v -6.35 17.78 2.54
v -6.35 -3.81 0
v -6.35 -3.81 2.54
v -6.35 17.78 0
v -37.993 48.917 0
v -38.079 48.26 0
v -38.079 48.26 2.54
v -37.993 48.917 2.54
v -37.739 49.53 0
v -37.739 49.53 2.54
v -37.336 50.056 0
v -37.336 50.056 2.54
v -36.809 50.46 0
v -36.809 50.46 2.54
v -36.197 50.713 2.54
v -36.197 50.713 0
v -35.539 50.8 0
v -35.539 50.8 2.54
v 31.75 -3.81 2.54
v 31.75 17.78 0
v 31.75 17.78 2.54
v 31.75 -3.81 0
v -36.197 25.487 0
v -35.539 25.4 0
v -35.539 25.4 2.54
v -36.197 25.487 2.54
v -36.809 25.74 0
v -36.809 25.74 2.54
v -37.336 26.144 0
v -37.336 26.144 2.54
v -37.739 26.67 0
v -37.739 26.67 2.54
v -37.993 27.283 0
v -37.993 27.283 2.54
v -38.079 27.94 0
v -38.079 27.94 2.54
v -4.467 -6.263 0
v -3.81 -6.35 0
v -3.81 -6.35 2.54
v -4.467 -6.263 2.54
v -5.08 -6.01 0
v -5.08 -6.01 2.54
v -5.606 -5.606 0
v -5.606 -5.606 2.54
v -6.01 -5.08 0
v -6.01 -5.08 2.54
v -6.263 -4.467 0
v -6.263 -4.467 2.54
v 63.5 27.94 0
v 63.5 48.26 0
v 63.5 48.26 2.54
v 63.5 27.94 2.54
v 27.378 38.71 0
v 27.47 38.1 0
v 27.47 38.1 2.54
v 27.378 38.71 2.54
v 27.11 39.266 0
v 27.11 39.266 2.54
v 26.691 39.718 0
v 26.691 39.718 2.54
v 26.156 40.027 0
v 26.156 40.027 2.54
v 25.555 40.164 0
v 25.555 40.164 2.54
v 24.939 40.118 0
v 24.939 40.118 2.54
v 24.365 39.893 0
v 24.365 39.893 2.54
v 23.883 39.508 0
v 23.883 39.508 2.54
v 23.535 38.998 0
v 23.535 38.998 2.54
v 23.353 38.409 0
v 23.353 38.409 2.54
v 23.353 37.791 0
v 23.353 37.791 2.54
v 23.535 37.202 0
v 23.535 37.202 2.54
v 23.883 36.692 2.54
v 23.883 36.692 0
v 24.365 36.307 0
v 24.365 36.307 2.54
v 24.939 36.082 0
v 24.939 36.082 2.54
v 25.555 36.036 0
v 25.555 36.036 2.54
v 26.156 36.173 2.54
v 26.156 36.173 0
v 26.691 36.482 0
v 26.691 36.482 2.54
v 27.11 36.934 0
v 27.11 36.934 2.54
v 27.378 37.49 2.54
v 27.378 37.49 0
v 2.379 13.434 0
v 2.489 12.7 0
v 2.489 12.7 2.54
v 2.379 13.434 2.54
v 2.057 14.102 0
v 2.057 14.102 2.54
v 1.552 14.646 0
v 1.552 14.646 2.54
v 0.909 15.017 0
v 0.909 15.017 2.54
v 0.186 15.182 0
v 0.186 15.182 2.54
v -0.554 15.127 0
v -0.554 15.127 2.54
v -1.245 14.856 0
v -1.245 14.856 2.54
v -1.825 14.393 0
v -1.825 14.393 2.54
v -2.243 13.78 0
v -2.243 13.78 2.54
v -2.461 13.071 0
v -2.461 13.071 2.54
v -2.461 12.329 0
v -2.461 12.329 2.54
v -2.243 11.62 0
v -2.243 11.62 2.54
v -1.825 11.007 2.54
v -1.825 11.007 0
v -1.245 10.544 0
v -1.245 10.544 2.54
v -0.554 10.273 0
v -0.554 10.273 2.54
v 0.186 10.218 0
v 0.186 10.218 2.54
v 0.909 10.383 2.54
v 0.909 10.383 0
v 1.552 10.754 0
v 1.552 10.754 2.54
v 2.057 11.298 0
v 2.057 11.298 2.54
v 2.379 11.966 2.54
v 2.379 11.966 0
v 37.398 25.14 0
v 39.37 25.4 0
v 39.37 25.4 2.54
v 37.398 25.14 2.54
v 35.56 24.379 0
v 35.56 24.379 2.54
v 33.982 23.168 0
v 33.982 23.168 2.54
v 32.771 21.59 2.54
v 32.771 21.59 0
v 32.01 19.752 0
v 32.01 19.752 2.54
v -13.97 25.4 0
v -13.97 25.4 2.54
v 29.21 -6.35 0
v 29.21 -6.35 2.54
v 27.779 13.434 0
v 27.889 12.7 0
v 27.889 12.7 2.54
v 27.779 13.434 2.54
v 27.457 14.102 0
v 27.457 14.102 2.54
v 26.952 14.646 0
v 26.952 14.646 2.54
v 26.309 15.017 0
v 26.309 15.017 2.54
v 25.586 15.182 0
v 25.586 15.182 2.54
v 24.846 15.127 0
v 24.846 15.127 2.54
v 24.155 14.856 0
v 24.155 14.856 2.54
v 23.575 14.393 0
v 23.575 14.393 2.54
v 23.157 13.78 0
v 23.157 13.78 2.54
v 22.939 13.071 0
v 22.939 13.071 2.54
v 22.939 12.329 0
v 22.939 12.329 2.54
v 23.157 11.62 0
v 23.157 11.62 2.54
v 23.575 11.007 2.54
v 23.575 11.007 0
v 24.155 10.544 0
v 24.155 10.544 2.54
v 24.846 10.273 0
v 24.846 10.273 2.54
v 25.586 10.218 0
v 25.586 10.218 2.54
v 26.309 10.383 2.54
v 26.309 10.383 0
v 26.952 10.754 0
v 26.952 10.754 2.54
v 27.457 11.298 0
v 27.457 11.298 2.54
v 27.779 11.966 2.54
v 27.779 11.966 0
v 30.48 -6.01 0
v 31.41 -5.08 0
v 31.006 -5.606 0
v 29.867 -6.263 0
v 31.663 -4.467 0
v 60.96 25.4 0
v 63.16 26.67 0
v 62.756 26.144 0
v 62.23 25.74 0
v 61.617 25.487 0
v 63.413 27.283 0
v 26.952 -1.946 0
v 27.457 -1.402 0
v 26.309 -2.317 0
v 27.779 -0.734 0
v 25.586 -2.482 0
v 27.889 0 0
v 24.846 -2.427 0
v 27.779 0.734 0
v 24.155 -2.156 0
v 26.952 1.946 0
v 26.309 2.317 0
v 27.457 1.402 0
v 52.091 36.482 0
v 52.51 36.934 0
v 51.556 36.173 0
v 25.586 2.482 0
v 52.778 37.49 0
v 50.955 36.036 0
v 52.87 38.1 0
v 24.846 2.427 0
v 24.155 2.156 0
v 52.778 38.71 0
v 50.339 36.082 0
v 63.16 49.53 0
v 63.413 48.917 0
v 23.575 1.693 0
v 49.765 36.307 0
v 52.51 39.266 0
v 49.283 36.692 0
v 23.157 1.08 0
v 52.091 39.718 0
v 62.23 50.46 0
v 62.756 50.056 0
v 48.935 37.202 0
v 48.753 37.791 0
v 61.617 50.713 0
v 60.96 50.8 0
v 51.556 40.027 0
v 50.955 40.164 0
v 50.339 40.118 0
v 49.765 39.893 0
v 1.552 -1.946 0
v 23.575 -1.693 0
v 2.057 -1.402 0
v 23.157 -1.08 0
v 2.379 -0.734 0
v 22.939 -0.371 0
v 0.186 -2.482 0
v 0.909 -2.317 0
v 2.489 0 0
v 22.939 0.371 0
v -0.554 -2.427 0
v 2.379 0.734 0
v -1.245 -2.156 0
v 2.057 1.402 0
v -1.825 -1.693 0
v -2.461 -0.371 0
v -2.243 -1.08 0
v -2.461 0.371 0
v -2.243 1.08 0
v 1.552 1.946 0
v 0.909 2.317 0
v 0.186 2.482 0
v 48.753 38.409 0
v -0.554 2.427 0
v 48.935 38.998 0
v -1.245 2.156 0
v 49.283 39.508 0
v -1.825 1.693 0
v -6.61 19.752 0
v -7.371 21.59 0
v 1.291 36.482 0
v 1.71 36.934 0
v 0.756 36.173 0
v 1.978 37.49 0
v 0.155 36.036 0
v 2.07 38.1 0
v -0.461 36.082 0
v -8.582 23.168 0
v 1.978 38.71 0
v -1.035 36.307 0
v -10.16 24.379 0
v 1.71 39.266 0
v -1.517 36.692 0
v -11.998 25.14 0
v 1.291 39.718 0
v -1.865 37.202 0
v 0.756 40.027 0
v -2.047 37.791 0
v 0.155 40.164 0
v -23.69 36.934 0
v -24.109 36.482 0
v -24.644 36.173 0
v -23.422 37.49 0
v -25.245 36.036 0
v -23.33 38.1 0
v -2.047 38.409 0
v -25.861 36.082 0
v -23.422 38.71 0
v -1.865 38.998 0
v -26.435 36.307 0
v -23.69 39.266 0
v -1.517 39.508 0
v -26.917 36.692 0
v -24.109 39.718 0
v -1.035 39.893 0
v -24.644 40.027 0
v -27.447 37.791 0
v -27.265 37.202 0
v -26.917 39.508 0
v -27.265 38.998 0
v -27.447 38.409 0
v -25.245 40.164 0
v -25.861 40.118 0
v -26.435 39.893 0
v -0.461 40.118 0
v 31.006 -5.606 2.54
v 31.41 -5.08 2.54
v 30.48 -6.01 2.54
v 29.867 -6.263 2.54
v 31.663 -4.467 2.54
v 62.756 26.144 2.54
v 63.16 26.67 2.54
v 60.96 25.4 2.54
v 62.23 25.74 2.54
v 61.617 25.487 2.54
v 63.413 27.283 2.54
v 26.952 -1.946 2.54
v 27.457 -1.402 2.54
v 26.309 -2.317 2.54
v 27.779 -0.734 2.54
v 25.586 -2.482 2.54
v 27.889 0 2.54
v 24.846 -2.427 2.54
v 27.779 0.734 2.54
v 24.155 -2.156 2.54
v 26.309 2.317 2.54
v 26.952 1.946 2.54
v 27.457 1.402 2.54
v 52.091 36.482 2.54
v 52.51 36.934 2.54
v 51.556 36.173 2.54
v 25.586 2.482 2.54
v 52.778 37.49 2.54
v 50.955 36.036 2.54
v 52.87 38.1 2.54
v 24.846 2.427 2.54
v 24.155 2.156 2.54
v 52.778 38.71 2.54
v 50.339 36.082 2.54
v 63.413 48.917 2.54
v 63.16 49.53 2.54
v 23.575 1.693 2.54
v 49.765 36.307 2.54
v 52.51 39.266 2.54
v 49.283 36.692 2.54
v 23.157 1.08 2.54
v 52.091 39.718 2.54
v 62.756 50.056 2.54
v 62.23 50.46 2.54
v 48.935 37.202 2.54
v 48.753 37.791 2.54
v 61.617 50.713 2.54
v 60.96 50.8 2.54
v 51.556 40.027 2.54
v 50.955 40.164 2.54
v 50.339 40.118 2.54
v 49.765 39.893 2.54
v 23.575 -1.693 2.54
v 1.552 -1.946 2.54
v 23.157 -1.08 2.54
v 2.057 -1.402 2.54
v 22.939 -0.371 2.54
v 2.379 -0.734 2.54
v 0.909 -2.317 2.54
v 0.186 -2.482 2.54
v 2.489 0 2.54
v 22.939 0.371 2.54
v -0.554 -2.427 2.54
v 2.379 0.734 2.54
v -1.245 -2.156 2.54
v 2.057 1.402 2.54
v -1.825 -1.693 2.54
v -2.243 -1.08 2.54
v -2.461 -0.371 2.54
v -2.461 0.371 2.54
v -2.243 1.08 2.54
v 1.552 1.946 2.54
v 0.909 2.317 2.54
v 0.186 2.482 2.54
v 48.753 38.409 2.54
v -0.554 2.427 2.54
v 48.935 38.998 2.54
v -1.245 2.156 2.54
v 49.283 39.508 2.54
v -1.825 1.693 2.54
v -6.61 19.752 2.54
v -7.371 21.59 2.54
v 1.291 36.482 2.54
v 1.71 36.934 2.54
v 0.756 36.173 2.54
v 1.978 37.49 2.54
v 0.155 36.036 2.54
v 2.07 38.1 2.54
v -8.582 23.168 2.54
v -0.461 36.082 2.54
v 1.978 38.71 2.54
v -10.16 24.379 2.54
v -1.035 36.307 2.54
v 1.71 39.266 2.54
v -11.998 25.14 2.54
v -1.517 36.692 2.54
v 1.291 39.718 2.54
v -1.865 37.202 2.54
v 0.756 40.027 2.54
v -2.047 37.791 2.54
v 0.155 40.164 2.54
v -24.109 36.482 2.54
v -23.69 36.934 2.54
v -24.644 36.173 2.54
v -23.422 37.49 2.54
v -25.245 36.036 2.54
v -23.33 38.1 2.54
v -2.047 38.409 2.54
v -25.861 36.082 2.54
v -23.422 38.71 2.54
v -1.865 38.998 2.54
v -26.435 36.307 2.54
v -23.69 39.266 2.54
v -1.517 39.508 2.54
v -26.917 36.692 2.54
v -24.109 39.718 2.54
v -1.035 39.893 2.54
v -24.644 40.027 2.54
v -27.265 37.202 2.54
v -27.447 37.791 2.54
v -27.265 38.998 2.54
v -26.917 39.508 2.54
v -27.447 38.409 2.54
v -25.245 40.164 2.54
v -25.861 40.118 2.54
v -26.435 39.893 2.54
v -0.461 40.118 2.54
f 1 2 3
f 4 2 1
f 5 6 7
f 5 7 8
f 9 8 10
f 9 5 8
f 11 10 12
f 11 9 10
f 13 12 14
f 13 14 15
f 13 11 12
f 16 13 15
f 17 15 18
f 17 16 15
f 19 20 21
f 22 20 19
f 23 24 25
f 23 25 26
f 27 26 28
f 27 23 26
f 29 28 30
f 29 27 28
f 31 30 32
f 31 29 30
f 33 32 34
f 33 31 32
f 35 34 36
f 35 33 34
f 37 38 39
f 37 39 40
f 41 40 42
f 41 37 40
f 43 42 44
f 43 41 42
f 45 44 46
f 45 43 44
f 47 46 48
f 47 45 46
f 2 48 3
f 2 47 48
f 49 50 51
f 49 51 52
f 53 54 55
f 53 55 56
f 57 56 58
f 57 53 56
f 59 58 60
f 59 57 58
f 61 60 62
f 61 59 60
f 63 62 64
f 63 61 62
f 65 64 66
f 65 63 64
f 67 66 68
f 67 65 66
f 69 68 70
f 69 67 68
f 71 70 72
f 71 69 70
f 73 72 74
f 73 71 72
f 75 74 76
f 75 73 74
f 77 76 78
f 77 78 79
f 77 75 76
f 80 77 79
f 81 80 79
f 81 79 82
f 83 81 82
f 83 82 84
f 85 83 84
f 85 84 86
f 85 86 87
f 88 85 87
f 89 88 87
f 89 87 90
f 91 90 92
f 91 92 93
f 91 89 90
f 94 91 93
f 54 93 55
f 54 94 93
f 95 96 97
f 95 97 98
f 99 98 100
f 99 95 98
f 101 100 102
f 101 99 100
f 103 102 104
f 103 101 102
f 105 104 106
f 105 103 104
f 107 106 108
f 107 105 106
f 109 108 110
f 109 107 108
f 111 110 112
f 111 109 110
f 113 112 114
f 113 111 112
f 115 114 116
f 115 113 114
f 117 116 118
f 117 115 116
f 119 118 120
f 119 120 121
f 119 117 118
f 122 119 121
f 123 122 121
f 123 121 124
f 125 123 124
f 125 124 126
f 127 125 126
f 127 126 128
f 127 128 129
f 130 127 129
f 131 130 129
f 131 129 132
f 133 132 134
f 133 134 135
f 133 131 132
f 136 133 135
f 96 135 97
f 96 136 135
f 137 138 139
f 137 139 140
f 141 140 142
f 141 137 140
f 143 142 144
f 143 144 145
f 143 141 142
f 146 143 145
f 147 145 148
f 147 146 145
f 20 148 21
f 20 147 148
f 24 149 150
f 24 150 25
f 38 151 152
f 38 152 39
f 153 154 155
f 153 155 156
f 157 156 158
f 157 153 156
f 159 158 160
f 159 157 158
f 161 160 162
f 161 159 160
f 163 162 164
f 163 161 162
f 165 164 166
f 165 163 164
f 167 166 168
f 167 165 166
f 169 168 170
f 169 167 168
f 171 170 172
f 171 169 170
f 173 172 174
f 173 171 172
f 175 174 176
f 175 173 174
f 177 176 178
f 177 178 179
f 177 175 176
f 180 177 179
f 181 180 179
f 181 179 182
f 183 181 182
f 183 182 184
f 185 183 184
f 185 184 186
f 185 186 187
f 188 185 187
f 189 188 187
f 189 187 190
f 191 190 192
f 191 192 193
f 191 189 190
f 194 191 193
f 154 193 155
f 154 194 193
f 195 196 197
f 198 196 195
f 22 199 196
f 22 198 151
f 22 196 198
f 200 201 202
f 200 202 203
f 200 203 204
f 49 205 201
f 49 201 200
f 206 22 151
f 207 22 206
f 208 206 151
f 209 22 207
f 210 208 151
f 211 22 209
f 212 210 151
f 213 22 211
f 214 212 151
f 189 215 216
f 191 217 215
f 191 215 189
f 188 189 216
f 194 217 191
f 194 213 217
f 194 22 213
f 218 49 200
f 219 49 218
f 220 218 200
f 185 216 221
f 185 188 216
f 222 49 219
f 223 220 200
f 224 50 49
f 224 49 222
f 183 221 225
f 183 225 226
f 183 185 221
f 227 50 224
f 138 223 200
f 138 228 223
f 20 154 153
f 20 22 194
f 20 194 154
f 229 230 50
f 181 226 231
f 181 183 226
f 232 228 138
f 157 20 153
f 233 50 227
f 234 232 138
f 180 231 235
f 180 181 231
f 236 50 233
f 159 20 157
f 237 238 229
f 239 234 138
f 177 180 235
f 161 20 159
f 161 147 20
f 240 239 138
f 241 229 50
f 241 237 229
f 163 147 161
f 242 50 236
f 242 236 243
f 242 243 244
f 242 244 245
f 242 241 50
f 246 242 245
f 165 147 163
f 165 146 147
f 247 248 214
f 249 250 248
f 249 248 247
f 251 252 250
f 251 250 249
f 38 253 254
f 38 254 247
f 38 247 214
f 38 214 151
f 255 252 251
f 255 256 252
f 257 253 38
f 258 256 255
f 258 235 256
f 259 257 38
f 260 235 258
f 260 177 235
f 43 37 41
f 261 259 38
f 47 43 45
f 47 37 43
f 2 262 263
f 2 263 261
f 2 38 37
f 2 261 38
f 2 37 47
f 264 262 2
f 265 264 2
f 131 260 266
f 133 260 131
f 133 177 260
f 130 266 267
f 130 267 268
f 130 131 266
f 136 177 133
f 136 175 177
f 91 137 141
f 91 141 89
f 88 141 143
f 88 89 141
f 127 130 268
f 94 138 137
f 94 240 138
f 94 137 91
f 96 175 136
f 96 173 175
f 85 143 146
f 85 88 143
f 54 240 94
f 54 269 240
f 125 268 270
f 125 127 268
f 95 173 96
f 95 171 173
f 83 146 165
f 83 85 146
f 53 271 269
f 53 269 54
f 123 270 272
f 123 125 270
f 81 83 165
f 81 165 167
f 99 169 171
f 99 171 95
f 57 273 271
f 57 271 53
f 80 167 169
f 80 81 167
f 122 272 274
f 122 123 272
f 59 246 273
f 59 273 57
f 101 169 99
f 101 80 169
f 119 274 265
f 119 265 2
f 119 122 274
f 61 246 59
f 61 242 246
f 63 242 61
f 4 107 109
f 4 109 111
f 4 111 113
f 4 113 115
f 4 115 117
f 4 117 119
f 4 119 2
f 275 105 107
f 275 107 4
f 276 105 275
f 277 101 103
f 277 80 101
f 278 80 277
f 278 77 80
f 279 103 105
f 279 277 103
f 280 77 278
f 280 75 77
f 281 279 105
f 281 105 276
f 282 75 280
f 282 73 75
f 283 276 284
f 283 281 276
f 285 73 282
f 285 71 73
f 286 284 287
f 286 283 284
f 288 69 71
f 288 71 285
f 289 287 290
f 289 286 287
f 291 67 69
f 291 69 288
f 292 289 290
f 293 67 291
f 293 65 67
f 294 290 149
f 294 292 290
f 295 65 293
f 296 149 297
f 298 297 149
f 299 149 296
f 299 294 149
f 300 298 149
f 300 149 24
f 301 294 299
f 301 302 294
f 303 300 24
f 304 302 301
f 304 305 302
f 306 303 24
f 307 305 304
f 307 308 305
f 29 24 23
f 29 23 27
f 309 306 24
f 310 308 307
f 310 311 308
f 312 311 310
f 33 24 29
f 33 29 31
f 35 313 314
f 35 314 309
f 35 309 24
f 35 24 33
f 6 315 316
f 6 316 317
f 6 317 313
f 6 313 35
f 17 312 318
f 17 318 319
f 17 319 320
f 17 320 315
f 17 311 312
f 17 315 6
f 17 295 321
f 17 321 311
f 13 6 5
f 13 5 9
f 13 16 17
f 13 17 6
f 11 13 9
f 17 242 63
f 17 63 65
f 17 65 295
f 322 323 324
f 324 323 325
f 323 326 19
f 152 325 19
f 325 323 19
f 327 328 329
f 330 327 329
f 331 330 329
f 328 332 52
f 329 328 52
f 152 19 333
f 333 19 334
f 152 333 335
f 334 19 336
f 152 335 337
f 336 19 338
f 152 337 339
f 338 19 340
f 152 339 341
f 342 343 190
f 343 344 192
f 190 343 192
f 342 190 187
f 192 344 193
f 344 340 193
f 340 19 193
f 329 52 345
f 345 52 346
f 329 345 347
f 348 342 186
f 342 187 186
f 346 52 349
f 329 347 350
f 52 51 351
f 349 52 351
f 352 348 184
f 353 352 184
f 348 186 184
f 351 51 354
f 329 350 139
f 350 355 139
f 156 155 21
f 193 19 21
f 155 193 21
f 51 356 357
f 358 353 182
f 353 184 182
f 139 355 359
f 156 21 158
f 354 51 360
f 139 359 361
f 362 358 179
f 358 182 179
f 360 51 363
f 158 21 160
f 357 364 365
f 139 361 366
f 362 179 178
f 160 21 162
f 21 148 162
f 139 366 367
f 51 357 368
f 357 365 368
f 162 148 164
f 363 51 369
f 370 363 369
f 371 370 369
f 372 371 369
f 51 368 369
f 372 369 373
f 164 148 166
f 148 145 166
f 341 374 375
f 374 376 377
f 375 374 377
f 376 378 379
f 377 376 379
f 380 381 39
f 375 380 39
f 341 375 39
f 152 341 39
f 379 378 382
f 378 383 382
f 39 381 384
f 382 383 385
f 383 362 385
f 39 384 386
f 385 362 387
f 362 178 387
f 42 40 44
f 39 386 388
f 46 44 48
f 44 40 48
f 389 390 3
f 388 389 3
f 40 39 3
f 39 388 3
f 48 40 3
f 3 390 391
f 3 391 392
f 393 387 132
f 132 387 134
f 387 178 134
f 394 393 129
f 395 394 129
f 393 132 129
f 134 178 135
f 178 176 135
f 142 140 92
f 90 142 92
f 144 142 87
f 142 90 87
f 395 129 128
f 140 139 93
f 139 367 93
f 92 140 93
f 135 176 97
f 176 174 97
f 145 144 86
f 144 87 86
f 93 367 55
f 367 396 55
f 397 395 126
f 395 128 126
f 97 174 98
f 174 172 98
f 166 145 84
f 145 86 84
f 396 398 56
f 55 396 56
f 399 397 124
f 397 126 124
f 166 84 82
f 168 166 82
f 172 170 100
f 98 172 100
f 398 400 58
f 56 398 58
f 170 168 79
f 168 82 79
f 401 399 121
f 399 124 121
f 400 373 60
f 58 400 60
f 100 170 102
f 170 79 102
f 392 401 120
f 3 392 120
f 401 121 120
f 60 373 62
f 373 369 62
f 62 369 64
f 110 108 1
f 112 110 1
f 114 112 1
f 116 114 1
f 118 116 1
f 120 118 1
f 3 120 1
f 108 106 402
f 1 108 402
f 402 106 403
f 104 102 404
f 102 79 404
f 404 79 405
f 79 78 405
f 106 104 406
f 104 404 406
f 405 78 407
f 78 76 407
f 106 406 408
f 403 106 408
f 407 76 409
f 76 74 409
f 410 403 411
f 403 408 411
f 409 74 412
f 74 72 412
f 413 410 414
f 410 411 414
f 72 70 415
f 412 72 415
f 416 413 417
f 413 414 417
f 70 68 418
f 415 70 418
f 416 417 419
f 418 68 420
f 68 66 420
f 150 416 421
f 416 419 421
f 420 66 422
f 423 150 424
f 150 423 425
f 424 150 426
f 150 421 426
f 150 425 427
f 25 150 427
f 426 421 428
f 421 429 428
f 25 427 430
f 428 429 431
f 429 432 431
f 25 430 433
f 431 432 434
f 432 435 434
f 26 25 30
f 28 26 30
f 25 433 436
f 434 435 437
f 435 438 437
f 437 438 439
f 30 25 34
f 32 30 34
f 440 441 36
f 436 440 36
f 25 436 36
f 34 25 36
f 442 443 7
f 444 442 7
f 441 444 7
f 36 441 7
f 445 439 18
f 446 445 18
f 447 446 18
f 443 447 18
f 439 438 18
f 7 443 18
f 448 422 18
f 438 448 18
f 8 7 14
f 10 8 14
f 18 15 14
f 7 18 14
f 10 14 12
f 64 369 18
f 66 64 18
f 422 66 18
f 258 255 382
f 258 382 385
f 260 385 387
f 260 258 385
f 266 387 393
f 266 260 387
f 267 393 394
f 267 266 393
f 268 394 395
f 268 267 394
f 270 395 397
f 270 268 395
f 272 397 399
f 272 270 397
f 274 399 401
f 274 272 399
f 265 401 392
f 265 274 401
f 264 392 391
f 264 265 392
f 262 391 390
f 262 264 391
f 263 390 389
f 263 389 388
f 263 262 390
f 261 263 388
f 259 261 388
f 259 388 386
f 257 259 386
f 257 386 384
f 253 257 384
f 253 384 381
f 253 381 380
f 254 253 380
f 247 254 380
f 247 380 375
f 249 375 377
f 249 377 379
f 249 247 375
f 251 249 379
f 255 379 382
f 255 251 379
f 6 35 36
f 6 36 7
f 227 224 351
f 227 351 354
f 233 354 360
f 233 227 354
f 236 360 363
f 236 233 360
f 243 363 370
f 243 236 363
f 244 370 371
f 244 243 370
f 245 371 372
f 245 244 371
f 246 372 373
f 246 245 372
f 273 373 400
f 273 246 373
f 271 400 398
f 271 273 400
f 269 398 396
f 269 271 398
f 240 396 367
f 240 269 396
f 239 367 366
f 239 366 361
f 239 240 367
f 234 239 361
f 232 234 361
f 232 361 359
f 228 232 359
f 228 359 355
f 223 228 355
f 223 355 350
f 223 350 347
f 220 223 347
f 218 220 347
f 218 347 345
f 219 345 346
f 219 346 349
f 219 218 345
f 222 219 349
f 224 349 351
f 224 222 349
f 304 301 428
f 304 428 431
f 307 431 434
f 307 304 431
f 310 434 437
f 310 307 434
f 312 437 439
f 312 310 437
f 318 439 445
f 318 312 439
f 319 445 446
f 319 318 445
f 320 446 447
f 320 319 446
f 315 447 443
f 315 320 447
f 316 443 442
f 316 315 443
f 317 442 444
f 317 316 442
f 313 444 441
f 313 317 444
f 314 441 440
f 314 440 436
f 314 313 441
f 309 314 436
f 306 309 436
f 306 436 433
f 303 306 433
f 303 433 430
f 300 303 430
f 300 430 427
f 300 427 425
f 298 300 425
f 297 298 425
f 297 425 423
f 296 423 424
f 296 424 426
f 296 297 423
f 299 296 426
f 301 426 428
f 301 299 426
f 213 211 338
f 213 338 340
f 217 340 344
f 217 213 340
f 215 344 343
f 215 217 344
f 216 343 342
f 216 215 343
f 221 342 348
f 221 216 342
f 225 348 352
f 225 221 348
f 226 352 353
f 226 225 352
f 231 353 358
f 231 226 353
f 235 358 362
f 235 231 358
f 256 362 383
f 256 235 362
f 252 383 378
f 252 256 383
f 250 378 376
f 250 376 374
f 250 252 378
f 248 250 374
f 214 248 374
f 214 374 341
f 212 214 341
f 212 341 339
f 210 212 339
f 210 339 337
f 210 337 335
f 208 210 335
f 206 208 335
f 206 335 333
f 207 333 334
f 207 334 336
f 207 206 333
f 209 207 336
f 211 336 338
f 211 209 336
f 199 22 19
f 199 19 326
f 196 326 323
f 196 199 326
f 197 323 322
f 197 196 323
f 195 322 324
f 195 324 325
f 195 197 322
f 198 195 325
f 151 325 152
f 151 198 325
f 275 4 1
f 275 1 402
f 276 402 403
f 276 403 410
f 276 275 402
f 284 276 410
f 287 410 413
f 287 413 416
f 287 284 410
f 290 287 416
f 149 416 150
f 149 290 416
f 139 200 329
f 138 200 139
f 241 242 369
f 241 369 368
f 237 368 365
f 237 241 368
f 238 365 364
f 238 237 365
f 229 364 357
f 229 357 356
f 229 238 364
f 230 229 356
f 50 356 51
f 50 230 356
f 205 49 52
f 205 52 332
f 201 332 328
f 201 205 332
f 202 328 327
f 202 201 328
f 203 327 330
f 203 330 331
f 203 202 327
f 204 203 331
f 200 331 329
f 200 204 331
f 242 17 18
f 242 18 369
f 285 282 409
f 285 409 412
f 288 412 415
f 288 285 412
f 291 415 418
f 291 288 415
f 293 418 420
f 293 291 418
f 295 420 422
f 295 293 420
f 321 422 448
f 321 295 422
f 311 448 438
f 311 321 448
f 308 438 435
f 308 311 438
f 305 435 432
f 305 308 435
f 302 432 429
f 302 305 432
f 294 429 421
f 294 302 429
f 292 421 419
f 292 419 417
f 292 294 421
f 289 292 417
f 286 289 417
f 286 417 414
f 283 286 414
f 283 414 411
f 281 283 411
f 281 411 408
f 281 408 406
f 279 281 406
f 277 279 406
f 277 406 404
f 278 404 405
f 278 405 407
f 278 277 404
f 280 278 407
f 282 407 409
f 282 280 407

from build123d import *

# Parameters (mm, degrees)
SKETCH1_R           = 2.0701
SKETCH1_R_2         = 2.4892
BOSS_EXTRUDE1_DEPTH = 2.54


with BuildPart() as part:
    # Sketch1 → Boss-Extrude1 (new body)
    with BuildSketch(Plane.XY):
        with BuildLine():
            Line((-35.539454624, 50.8), (60.96, 50.8))
            ThreePointArc((60.96, 50.8), (62.756051224, 50.056051224), (63.5, 48.26))
            Line((63.5, 48.26), (63.5, 27.94))
            ThreePointArc((63.5, 27.94), (62.756051224, 26.143948776), (60.96, 25.4))
            Line((60.96, 25.4), (39.37, 25.4))
            ThreePointArc((39.37, 25.4), (33.981846327, 23.168153673), (31.75, 17.78))
            Line((31.75, 17.78), (31.75, -3.81))
            ThreePointArc((31.75, -3.81), (31.006051224, -5.606051224), (29.21, -6.35))
            Line((29.21, -6.35), (-3.81, -6.35))
            ThreePointArc((-3.81, -6.35), (-5.606051224, -5.606051224), (-6.35, -3.81))
            Line((-6.35, -3.81), (-6.35, 17.78))
            ThreePointArc((-6.35, 17.78), (-8.581846327, 23.168153673), (-13.97, 25.4))
            Line((-13.97, 25.4), (-35.539454624, 25.4))
            ThreePointArc((-35.539454624, 25.4), (-37.335505848, 26.143948776), (-38.079454624, 27.94))
            Line((-38.079454624, 27.94), (-38.079454624, 48.26))
            ThreePointArc((-38.079454624, 48.26), (-37.335505848, 50.056051224), (-35.539454624, 50.8))
        make_face()
        with Locations((-25.4, 38.1)):
            Circle(SKETCH1_R, mode=Mode.SUBTRACT)
        with Locations((0, 38.1)):
            Circle(SKETCH1_R, mode=Mode.SUBTRACT)
        with Locations((25.4, 38.1)):
            Circle(SKETCH1_R, mode=Mode.SUBTRACT)
        with Locations((50.8, 38.1)):
            Circle(SKETCH1_R, mode=Mode.SUBTRACT)
        with Locations((0, 12.7)):
            Circle(SKETCH1_R_2, mode=Mode.SUBTRACT)
        Circle(SKETCH1_R_2, mode=Mode.SUBTRACT)
        with Locations((25.4, 12.7)):
            Circle(SKETCH1_R_2, mode=Mode.SUBTRACT)
        with Locations((25.4, 0)):
            Circle(SKETCH1_R_2, mode=Mode.SUBTRACT)
    extrude(amount=BOSS_EXTRUDE1_DEPTH)


solid = part.part
